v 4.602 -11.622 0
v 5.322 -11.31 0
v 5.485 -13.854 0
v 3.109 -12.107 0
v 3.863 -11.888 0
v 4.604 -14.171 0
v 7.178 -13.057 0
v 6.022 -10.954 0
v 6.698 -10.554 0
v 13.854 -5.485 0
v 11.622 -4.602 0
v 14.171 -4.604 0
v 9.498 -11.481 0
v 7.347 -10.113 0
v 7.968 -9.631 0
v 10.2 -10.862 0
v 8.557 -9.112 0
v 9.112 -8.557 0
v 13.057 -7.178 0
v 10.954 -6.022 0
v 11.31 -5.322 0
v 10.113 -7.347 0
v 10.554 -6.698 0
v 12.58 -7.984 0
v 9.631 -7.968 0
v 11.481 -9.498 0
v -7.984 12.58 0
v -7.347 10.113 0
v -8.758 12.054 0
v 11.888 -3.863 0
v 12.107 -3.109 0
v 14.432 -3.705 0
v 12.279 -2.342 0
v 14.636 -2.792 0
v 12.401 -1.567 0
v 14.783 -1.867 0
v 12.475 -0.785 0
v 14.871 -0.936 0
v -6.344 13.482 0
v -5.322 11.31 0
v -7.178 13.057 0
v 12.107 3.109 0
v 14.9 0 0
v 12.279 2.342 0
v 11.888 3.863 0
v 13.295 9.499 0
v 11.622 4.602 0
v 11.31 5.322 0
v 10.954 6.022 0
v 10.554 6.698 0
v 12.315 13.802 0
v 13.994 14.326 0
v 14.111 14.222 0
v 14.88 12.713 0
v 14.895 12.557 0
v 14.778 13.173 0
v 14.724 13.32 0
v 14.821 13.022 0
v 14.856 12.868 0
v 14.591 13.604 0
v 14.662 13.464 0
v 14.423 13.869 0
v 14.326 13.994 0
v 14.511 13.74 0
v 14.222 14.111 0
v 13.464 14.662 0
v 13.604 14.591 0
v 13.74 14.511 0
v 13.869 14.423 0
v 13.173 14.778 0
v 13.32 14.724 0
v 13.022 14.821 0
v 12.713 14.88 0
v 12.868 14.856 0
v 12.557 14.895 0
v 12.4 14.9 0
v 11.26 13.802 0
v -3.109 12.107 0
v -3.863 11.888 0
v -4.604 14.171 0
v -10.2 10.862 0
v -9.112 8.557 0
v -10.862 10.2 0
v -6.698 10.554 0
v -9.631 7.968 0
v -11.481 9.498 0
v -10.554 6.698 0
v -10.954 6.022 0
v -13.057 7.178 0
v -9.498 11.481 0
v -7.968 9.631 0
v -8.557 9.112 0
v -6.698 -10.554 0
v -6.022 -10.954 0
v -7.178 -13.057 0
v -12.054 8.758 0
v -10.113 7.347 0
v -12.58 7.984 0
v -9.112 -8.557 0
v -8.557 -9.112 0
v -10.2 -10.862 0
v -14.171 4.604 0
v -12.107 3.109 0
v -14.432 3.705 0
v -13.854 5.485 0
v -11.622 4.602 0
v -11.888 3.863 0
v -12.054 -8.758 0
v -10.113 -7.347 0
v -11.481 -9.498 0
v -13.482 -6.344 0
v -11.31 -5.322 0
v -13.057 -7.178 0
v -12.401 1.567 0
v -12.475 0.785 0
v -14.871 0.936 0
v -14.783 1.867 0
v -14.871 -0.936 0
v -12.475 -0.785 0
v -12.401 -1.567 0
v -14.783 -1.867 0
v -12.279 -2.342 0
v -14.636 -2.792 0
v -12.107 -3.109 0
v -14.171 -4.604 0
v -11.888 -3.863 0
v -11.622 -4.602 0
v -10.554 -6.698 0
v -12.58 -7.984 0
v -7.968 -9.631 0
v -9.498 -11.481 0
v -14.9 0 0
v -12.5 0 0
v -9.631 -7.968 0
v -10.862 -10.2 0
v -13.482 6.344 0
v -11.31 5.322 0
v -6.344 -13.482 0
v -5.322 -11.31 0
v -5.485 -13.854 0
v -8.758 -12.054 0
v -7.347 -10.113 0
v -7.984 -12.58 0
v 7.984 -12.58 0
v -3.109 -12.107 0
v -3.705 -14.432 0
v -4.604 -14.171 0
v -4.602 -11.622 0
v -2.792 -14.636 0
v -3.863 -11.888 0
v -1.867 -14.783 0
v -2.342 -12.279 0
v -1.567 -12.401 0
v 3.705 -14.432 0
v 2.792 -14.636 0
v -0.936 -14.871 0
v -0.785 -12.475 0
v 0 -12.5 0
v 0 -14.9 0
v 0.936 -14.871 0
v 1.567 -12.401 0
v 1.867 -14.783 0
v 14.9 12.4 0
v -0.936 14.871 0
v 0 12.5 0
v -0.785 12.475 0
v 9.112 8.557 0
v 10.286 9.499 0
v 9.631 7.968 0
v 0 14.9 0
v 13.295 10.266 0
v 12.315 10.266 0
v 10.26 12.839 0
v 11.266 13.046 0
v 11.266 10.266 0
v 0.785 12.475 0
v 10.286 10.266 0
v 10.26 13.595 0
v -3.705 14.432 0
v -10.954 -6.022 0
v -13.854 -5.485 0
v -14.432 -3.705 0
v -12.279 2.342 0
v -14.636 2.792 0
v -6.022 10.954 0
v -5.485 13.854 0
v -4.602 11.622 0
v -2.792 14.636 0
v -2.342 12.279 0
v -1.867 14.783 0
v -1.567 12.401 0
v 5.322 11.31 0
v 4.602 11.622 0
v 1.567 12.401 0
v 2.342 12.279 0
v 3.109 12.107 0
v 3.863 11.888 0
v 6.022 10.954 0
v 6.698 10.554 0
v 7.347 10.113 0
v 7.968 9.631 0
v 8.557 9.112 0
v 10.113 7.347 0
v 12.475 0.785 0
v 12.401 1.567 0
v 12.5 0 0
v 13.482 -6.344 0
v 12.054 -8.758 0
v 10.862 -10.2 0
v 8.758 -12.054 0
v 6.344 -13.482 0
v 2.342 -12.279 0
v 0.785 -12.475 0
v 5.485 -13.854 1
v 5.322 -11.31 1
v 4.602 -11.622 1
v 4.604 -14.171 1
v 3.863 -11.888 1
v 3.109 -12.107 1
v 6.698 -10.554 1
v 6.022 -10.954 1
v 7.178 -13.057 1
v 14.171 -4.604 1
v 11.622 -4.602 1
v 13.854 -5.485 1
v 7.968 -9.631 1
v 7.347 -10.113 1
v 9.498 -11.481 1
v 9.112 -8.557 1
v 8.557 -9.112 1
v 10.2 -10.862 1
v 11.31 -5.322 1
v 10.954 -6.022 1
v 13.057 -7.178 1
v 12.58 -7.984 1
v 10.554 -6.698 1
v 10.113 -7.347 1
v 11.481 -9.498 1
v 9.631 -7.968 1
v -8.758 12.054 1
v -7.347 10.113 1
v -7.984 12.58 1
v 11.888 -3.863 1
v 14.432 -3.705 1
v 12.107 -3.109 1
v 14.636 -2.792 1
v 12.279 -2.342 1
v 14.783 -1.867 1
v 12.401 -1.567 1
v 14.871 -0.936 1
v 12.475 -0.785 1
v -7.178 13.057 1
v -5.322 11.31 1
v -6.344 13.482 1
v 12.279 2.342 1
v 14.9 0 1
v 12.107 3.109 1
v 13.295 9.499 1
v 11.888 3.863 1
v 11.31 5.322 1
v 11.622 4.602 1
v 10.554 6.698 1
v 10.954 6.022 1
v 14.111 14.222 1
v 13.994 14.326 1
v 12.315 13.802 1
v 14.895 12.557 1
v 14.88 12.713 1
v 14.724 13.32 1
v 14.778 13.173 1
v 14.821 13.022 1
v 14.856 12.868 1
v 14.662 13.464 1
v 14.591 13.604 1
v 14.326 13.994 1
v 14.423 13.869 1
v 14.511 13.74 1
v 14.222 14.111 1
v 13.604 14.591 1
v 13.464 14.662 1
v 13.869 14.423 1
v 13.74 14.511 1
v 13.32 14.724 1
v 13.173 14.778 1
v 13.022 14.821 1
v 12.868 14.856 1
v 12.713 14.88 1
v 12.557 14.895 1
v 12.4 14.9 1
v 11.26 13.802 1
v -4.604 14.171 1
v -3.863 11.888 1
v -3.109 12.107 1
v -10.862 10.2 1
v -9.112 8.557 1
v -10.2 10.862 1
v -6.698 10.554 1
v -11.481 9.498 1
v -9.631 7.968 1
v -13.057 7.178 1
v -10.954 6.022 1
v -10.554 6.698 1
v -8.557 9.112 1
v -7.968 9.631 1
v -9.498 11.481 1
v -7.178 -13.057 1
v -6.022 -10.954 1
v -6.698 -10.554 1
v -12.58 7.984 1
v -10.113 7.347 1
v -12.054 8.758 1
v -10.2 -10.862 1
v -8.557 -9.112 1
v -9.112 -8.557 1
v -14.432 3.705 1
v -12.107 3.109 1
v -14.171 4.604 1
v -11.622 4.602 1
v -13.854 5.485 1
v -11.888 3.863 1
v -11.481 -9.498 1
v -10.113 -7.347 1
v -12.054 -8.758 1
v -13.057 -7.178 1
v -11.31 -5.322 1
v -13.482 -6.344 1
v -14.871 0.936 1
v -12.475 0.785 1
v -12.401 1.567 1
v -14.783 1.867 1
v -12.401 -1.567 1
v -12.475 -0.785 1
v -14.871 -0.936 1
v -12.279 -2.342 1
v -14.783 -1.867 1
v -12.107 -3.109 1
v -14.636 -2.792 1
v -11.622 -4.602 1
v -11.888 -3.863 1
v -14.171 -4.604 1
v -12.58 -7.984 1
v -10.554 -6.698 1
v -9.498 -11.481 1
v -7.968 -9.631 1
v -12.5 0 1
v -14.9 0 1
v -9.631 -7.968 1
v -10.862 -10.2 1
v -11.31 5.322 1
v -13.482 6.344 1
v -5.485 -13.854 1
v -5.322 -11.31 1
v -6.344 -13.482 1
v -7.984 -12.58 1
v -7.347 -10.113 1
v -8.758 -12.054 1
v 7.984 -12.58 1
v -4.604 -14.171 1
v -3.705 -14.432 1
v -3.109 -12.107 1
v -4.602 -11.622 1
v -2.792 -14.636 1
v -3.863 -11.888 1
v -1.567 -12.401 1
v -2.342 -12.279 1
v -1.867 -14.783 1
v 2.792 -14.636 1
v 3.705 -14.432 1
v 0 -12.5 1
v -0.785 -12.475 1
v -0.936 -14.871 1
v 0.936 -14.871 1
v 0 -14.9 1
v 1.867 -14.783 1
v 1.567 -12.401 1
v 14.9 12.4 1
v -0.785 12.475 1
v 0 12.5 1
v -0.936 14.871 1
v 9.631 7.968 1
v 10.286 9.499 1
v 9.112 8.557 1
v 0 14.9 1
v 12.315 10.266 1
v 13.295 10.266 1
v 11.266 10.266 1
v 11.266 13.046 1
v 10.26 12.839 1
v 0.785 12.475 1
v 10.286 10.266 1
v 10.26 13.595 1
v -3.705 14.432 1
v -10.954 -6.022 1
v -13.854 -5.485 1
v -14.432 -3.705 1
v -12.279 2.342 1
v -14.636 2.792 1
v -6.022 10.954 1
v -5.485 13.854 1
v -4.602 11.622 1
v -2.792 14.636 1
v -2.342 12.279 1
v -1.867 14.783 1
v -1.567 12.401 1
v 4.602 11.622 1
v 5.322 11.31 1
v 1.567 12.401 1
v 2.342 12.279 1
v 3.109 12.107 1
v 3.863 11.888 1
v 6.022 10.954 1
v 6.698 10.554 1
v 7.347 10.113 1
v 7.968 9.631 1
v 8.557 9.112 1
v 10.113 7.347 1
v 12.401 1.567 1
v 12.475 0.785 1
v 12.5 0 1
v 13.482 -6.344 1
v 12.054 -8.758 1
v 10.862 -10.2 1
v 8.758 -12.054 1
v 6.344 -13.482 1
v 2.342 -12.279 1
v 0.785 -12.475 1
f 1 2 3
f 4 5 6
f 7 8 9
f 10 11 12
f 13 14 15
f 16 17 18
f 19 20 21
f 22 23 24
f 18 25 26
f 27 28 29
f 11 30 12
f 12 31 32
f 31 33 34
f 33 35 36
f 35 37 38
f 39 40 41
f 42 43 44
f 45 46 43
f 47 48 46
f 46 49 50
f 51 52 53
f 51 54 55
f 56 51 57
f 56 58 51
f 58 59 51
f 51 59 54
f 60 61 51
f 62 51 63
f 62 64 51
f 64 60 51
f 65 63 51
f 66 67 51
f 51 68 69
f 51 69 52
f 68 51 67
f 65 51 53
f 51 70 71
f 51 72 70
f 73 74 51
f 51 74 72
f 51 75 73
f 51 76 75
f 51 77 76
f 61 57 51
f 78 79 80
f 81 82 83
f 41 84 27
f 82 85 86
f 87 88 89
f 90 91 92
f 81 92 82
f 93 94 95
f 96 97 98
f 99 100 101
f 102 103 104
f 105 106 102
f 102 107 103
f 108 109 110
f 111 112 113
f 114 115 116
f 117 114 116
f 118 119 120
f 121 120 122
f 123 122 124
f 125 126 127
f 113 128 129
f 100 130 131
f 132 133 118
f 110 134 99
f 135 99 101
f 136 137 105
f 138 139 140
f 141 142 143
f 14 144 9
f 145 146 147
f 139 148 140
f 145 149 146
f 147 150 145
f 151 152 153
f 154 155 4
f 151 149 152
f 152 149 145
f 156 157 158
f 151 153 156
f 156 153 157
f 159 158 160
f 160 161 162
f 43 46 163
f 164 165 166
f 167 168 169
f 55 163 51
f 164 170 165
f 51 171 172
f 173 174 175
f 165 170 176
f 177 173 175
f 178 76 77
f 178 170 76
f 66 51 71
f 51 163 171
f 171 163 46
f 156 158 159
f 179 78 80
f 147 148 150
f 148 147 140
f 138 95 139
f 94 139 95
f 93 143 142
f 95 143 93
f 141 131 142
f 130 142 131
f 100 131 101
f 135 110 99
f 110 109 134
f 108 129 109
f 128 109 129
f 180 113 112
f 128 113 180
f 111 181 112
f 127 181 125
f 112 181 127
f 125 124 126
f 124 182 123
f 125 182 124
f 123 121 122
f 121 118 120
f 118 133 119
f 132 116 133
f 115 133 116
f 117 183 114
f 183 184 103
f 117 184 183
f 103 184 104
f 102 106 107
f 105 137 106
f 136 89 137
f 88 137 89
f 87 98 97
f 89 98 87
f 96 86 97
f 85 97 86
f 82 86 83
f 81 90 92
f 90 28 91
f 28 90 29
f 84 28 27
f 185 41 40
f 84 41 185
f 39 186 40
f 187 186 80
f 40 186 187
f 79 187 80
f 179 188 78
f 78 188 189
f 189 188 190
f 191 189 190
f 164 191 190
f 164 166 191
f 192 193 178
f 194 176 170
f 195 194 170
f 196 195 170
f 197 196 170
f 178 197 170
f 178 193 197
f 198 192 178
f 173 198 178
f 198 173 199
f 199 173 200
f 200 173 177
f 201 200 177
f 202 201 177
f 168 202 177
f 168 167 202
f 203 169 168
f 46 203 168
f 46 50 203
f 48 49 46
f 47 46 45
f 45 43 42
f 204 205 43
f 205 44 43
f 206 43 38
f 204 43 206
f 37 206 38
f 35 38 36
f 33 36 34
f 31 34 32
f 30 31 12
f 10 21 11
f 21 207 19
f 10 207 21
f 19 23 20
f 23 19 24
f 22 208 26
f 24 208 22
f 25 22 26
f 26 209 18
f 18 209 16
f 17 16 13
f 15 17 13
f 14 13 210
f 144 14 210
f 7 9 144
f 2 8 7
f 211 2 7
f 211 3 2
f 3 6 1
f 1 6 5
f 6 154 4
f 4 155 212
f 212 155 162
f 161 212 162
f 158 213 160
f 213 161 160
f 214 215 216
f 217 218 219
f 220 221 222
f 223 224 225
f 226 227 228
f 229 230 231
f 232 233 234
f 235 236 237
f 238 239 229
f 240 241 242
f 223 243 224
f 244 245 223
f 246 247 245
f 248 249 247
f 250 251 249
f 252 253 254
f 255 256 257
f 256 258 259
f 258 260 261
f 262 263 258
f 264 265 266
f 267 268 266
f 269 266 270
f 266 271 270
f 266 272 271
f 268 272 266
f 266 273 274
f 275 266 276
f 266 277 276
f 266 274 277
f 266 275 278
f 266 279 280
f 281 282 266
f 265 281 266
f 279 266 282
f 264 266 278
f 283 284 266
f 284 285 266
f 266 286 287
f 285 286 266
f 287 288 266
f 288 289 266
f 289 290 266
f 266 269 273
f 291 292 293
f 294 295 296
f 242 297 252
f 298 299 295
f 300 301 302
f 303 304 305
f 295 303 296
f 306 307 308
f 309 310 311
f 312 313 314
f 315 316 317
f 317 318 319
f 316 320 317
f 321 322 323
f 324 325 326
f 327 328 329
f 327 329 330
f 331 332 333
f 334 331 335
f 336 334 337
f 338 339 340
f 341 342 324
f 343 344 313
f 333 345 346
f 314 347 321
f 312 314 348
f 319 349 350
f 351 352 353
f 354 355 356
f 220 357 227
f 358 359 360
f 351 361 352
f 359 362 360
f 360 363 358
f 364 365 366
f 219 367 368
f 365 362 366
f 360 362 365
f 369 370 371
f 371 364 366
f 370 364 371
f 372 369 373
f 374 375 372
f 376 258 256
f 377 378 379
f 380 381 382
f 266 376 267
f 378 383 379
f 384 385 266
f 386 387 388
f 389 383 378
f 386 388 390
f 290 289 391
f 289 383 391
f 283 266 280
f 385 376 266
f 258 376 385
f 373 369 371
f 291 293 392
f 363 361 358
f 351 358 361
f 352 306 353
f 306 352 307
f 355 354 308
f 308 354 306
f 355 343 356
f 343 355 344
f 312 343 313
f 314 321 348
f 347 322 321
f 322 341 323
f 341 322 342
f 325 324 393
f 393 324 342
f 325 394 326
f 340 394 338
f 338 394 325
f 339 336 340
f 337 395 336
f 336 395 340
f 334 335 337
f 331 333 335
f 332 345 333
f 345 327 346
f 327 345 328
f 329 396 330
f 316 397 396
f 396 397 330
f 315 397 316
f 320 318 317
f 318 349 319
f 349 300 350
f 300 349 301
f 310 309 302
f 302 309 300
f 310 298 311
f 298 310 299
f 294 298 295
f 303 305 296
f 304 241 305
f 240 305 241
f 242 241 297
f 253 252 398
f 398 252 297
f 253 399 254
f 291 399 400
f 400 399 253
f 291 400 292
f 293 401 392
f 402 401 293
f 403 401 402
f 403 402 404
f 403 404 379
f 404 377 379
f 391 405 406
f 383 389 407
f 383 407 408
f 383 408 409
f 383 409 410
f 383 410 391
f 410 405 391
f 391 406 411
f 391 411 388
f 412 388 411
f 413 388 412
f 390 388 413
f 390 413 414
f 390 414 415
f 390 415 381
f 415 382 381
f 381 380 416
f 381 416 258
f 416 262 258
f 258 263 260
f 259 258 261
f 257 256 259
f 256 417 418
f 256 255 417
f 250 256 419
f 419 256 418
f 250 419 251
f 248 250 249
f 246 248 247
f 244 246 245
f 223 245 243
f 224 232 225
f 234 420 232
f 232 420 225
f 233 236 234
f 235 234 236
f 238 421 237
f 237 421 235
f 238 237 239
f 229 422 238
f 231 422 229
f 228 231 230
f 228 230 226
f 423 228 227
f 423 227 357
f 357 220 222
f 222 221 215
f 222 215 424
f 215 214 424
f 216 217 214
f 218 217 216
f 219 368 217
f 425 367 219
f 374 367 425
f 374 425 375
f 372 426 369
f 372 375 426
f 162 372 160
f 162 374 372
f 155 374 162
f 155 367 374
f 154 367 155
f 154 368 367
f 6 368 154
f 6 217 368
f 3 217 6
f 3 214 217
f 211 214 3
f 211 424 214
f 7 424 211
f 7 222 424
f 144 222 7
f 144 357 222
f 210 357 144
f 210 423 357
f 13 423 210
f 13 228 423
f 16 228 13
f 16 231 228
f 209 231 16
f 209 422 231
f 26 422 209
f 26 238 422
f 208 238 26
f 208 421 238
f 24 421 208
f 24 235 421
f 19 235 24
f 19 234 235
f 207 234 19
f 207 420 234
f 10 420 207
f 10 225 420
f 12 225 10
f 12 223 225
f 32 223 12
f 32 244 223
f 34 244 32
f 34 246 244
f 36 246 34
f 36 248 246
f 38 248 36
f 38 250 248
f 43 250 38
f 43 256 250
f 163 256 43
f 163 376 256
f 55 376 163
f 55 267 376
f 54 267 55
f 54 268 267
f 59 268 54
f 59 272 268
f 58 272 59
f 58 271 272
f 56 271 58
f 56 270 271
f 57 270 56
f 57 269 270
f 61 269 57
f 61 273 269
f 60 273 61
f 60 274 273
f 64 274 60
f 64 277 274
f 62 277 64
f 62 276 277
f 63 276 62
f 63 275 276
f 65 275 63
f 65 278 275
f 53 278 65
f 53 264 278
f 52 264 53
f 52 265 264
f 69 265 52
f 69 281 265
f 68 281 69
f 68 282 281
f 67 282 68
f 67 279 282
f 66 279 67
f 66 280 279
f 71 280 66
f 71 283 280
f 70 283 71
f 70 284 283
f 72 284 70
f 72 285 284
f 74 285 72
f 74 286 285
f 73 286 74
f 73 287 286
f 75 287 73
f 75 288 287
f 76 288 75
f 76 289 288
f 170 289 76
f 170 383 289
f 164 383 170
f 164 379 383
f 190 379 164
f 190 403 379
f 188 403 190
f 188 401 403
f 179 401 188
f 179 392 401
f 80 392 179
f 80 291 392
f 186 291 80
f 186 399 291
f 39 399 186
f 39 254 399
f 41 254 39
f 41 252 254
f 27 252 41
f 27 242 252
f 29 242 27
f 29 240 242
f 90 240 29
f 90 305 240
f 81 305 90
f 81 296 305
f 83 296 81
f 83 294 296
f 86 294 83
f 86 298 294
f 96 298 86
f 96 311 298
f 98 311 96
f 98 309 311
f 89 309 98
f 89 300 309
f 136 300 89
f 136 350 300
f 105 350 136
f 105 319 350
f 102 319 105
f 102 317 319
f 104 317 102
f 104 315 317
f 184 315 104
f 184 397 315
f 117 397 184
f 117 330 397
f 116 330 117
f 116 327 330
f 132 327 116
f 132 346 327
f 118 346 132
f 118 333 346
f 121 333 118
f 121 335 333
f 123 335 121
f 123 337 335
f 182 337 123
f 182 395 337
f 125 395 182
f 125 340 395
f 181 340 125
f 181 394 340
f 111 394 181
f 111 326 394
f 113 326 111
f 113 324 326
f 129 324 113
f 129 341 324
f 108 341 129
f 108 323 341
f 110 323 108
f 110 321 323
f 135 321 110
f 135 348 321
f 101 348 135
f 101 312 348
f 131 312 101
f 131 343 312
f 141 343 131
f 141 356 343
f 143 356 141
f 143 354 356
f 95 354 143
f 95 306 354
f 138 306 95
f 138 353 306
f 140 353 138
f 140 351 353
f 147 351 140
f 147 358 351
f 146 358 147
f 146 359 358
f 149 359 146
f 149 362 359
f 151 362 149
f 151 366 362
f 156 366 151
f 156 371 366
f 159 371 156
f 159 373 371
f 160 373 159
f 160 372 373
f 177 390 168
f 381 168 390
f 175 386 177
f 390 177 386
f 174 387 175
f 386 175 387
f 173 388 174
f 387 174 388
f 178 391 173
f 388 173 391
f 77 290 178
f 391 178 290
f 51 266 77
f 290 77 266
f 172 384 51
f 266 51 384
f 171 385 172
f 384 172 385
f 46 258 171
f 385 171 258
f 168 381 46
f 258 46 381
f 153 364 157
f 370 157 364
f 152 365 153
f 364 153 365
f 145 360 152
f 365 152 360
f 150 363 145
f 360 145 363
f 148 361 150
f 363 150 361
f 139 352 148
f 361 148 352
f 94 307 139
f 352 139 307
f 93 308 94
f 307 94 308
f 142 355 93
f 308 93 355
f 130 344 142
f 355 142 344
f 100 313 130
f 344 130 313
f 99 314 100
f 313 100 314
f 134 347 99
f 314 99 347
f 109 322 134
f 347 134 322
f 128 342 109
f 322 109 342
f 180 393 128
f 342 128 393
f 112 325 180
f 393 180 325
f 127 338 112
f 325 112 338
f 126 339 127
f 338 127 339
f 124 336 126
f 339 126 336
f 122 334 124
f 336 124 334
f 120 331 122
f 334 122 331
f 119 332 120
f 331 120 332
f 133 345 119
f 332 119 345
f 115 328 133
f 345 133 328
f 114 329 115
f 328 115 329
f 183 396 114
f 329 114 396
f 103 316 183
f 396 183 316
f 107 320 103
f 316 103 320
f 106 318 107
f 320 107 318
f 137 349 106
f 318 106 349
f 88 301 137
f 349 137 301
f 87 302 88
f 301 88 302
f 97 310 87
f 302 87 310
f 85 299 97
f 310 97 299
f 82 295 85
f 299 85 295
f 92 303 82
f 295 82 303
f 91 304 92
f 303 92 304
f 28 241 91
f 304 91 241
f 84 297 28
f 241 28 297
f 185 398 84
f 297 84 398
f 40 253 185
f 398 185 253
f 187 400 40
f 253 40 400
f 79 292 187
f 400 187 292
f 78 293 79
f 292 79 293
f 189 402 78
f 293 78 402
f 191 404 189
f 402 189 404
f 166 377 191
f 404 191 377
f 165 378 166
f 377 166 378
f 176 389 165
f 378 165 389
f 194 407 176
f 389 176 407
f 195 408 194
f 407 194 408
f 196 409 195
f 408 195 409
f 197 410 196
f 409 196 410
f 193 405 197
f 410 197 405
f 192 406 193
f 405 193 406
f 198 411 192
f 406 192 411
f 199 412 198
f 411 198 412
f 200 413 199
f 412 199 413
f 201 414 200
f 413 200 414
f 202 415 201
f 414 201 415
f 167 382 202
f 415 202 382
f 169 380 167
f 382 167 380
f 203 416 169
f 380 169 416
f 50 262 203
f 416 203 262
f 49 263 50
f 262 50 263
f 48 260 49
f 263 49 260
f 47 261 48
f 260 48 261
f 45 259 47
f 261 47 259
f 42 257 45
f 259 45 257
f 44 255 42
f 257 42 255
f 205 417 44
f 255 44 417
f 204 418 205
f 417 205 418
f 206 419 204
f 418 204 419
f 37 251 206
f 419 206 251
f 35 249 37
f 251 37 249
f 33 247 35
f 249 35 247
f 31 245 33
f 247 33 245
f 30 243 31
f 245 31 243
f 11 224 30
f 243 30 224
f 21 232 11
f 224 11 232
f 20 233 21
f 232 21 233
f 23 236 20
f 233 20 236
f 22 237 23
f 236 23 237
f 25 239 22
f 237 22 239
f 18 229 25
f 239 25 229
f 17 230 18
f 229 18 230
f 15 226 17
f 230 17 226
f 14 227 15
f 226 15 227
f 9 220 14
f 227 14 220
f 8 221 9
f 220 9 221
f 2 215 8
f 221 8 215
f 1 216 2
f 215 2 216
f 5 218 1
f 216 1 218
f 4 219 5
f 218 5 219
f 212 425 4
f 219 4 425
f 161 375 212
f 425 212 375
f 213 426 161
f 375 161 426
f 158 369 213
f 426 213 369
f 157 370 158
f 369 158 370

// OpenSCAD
//
// Map Marker
// Copyright (C) 2022 Nils Weber
//
// Licensed under the MIT License
//

/* [Dimensions] */

// Diameter of the (inner) circle
Diameter = 25;

// Thickness of the (outside) wall
Wall = 2.4;

// Thickness of the entire marker
Thickness = 1;

/* [Marker] */

// Diameter of the marker ring
Marker_Diameter = 5;

// Text of the marker
Marker_Text = "1";

Font = "Roboto:bold";

/* [Hidden] */

$fn = 100;

ring_diameter = Diameter+Wall*2;
ring_radius = ring_diameter/2;
marker_offset = (ring_diameter - Marker_Diameter) / 2;
marker_text_size = Marker_Diameter * 0.85;

module base(marker, thickness=Thickness) {
    linear_extrude(thickness)
    difference() {
        
        // Base shape
        hull() {
            // Main ring
            circle(d=ring_diameter);

            // Marker
            translate([marker_offset, marker_offset, 0])
                circle(d=Marker_Diameter);
        }
        
        // Ring hole
        circle(d=Diameter);
        
        // Marker text
        translate([marker_offset - Wall/3, marker_offset - Wall/3, 0])
            text(marker, font=Font, size=marker_text_size, halign="center", valign="center");
    }
}


base(Marker_Text);
